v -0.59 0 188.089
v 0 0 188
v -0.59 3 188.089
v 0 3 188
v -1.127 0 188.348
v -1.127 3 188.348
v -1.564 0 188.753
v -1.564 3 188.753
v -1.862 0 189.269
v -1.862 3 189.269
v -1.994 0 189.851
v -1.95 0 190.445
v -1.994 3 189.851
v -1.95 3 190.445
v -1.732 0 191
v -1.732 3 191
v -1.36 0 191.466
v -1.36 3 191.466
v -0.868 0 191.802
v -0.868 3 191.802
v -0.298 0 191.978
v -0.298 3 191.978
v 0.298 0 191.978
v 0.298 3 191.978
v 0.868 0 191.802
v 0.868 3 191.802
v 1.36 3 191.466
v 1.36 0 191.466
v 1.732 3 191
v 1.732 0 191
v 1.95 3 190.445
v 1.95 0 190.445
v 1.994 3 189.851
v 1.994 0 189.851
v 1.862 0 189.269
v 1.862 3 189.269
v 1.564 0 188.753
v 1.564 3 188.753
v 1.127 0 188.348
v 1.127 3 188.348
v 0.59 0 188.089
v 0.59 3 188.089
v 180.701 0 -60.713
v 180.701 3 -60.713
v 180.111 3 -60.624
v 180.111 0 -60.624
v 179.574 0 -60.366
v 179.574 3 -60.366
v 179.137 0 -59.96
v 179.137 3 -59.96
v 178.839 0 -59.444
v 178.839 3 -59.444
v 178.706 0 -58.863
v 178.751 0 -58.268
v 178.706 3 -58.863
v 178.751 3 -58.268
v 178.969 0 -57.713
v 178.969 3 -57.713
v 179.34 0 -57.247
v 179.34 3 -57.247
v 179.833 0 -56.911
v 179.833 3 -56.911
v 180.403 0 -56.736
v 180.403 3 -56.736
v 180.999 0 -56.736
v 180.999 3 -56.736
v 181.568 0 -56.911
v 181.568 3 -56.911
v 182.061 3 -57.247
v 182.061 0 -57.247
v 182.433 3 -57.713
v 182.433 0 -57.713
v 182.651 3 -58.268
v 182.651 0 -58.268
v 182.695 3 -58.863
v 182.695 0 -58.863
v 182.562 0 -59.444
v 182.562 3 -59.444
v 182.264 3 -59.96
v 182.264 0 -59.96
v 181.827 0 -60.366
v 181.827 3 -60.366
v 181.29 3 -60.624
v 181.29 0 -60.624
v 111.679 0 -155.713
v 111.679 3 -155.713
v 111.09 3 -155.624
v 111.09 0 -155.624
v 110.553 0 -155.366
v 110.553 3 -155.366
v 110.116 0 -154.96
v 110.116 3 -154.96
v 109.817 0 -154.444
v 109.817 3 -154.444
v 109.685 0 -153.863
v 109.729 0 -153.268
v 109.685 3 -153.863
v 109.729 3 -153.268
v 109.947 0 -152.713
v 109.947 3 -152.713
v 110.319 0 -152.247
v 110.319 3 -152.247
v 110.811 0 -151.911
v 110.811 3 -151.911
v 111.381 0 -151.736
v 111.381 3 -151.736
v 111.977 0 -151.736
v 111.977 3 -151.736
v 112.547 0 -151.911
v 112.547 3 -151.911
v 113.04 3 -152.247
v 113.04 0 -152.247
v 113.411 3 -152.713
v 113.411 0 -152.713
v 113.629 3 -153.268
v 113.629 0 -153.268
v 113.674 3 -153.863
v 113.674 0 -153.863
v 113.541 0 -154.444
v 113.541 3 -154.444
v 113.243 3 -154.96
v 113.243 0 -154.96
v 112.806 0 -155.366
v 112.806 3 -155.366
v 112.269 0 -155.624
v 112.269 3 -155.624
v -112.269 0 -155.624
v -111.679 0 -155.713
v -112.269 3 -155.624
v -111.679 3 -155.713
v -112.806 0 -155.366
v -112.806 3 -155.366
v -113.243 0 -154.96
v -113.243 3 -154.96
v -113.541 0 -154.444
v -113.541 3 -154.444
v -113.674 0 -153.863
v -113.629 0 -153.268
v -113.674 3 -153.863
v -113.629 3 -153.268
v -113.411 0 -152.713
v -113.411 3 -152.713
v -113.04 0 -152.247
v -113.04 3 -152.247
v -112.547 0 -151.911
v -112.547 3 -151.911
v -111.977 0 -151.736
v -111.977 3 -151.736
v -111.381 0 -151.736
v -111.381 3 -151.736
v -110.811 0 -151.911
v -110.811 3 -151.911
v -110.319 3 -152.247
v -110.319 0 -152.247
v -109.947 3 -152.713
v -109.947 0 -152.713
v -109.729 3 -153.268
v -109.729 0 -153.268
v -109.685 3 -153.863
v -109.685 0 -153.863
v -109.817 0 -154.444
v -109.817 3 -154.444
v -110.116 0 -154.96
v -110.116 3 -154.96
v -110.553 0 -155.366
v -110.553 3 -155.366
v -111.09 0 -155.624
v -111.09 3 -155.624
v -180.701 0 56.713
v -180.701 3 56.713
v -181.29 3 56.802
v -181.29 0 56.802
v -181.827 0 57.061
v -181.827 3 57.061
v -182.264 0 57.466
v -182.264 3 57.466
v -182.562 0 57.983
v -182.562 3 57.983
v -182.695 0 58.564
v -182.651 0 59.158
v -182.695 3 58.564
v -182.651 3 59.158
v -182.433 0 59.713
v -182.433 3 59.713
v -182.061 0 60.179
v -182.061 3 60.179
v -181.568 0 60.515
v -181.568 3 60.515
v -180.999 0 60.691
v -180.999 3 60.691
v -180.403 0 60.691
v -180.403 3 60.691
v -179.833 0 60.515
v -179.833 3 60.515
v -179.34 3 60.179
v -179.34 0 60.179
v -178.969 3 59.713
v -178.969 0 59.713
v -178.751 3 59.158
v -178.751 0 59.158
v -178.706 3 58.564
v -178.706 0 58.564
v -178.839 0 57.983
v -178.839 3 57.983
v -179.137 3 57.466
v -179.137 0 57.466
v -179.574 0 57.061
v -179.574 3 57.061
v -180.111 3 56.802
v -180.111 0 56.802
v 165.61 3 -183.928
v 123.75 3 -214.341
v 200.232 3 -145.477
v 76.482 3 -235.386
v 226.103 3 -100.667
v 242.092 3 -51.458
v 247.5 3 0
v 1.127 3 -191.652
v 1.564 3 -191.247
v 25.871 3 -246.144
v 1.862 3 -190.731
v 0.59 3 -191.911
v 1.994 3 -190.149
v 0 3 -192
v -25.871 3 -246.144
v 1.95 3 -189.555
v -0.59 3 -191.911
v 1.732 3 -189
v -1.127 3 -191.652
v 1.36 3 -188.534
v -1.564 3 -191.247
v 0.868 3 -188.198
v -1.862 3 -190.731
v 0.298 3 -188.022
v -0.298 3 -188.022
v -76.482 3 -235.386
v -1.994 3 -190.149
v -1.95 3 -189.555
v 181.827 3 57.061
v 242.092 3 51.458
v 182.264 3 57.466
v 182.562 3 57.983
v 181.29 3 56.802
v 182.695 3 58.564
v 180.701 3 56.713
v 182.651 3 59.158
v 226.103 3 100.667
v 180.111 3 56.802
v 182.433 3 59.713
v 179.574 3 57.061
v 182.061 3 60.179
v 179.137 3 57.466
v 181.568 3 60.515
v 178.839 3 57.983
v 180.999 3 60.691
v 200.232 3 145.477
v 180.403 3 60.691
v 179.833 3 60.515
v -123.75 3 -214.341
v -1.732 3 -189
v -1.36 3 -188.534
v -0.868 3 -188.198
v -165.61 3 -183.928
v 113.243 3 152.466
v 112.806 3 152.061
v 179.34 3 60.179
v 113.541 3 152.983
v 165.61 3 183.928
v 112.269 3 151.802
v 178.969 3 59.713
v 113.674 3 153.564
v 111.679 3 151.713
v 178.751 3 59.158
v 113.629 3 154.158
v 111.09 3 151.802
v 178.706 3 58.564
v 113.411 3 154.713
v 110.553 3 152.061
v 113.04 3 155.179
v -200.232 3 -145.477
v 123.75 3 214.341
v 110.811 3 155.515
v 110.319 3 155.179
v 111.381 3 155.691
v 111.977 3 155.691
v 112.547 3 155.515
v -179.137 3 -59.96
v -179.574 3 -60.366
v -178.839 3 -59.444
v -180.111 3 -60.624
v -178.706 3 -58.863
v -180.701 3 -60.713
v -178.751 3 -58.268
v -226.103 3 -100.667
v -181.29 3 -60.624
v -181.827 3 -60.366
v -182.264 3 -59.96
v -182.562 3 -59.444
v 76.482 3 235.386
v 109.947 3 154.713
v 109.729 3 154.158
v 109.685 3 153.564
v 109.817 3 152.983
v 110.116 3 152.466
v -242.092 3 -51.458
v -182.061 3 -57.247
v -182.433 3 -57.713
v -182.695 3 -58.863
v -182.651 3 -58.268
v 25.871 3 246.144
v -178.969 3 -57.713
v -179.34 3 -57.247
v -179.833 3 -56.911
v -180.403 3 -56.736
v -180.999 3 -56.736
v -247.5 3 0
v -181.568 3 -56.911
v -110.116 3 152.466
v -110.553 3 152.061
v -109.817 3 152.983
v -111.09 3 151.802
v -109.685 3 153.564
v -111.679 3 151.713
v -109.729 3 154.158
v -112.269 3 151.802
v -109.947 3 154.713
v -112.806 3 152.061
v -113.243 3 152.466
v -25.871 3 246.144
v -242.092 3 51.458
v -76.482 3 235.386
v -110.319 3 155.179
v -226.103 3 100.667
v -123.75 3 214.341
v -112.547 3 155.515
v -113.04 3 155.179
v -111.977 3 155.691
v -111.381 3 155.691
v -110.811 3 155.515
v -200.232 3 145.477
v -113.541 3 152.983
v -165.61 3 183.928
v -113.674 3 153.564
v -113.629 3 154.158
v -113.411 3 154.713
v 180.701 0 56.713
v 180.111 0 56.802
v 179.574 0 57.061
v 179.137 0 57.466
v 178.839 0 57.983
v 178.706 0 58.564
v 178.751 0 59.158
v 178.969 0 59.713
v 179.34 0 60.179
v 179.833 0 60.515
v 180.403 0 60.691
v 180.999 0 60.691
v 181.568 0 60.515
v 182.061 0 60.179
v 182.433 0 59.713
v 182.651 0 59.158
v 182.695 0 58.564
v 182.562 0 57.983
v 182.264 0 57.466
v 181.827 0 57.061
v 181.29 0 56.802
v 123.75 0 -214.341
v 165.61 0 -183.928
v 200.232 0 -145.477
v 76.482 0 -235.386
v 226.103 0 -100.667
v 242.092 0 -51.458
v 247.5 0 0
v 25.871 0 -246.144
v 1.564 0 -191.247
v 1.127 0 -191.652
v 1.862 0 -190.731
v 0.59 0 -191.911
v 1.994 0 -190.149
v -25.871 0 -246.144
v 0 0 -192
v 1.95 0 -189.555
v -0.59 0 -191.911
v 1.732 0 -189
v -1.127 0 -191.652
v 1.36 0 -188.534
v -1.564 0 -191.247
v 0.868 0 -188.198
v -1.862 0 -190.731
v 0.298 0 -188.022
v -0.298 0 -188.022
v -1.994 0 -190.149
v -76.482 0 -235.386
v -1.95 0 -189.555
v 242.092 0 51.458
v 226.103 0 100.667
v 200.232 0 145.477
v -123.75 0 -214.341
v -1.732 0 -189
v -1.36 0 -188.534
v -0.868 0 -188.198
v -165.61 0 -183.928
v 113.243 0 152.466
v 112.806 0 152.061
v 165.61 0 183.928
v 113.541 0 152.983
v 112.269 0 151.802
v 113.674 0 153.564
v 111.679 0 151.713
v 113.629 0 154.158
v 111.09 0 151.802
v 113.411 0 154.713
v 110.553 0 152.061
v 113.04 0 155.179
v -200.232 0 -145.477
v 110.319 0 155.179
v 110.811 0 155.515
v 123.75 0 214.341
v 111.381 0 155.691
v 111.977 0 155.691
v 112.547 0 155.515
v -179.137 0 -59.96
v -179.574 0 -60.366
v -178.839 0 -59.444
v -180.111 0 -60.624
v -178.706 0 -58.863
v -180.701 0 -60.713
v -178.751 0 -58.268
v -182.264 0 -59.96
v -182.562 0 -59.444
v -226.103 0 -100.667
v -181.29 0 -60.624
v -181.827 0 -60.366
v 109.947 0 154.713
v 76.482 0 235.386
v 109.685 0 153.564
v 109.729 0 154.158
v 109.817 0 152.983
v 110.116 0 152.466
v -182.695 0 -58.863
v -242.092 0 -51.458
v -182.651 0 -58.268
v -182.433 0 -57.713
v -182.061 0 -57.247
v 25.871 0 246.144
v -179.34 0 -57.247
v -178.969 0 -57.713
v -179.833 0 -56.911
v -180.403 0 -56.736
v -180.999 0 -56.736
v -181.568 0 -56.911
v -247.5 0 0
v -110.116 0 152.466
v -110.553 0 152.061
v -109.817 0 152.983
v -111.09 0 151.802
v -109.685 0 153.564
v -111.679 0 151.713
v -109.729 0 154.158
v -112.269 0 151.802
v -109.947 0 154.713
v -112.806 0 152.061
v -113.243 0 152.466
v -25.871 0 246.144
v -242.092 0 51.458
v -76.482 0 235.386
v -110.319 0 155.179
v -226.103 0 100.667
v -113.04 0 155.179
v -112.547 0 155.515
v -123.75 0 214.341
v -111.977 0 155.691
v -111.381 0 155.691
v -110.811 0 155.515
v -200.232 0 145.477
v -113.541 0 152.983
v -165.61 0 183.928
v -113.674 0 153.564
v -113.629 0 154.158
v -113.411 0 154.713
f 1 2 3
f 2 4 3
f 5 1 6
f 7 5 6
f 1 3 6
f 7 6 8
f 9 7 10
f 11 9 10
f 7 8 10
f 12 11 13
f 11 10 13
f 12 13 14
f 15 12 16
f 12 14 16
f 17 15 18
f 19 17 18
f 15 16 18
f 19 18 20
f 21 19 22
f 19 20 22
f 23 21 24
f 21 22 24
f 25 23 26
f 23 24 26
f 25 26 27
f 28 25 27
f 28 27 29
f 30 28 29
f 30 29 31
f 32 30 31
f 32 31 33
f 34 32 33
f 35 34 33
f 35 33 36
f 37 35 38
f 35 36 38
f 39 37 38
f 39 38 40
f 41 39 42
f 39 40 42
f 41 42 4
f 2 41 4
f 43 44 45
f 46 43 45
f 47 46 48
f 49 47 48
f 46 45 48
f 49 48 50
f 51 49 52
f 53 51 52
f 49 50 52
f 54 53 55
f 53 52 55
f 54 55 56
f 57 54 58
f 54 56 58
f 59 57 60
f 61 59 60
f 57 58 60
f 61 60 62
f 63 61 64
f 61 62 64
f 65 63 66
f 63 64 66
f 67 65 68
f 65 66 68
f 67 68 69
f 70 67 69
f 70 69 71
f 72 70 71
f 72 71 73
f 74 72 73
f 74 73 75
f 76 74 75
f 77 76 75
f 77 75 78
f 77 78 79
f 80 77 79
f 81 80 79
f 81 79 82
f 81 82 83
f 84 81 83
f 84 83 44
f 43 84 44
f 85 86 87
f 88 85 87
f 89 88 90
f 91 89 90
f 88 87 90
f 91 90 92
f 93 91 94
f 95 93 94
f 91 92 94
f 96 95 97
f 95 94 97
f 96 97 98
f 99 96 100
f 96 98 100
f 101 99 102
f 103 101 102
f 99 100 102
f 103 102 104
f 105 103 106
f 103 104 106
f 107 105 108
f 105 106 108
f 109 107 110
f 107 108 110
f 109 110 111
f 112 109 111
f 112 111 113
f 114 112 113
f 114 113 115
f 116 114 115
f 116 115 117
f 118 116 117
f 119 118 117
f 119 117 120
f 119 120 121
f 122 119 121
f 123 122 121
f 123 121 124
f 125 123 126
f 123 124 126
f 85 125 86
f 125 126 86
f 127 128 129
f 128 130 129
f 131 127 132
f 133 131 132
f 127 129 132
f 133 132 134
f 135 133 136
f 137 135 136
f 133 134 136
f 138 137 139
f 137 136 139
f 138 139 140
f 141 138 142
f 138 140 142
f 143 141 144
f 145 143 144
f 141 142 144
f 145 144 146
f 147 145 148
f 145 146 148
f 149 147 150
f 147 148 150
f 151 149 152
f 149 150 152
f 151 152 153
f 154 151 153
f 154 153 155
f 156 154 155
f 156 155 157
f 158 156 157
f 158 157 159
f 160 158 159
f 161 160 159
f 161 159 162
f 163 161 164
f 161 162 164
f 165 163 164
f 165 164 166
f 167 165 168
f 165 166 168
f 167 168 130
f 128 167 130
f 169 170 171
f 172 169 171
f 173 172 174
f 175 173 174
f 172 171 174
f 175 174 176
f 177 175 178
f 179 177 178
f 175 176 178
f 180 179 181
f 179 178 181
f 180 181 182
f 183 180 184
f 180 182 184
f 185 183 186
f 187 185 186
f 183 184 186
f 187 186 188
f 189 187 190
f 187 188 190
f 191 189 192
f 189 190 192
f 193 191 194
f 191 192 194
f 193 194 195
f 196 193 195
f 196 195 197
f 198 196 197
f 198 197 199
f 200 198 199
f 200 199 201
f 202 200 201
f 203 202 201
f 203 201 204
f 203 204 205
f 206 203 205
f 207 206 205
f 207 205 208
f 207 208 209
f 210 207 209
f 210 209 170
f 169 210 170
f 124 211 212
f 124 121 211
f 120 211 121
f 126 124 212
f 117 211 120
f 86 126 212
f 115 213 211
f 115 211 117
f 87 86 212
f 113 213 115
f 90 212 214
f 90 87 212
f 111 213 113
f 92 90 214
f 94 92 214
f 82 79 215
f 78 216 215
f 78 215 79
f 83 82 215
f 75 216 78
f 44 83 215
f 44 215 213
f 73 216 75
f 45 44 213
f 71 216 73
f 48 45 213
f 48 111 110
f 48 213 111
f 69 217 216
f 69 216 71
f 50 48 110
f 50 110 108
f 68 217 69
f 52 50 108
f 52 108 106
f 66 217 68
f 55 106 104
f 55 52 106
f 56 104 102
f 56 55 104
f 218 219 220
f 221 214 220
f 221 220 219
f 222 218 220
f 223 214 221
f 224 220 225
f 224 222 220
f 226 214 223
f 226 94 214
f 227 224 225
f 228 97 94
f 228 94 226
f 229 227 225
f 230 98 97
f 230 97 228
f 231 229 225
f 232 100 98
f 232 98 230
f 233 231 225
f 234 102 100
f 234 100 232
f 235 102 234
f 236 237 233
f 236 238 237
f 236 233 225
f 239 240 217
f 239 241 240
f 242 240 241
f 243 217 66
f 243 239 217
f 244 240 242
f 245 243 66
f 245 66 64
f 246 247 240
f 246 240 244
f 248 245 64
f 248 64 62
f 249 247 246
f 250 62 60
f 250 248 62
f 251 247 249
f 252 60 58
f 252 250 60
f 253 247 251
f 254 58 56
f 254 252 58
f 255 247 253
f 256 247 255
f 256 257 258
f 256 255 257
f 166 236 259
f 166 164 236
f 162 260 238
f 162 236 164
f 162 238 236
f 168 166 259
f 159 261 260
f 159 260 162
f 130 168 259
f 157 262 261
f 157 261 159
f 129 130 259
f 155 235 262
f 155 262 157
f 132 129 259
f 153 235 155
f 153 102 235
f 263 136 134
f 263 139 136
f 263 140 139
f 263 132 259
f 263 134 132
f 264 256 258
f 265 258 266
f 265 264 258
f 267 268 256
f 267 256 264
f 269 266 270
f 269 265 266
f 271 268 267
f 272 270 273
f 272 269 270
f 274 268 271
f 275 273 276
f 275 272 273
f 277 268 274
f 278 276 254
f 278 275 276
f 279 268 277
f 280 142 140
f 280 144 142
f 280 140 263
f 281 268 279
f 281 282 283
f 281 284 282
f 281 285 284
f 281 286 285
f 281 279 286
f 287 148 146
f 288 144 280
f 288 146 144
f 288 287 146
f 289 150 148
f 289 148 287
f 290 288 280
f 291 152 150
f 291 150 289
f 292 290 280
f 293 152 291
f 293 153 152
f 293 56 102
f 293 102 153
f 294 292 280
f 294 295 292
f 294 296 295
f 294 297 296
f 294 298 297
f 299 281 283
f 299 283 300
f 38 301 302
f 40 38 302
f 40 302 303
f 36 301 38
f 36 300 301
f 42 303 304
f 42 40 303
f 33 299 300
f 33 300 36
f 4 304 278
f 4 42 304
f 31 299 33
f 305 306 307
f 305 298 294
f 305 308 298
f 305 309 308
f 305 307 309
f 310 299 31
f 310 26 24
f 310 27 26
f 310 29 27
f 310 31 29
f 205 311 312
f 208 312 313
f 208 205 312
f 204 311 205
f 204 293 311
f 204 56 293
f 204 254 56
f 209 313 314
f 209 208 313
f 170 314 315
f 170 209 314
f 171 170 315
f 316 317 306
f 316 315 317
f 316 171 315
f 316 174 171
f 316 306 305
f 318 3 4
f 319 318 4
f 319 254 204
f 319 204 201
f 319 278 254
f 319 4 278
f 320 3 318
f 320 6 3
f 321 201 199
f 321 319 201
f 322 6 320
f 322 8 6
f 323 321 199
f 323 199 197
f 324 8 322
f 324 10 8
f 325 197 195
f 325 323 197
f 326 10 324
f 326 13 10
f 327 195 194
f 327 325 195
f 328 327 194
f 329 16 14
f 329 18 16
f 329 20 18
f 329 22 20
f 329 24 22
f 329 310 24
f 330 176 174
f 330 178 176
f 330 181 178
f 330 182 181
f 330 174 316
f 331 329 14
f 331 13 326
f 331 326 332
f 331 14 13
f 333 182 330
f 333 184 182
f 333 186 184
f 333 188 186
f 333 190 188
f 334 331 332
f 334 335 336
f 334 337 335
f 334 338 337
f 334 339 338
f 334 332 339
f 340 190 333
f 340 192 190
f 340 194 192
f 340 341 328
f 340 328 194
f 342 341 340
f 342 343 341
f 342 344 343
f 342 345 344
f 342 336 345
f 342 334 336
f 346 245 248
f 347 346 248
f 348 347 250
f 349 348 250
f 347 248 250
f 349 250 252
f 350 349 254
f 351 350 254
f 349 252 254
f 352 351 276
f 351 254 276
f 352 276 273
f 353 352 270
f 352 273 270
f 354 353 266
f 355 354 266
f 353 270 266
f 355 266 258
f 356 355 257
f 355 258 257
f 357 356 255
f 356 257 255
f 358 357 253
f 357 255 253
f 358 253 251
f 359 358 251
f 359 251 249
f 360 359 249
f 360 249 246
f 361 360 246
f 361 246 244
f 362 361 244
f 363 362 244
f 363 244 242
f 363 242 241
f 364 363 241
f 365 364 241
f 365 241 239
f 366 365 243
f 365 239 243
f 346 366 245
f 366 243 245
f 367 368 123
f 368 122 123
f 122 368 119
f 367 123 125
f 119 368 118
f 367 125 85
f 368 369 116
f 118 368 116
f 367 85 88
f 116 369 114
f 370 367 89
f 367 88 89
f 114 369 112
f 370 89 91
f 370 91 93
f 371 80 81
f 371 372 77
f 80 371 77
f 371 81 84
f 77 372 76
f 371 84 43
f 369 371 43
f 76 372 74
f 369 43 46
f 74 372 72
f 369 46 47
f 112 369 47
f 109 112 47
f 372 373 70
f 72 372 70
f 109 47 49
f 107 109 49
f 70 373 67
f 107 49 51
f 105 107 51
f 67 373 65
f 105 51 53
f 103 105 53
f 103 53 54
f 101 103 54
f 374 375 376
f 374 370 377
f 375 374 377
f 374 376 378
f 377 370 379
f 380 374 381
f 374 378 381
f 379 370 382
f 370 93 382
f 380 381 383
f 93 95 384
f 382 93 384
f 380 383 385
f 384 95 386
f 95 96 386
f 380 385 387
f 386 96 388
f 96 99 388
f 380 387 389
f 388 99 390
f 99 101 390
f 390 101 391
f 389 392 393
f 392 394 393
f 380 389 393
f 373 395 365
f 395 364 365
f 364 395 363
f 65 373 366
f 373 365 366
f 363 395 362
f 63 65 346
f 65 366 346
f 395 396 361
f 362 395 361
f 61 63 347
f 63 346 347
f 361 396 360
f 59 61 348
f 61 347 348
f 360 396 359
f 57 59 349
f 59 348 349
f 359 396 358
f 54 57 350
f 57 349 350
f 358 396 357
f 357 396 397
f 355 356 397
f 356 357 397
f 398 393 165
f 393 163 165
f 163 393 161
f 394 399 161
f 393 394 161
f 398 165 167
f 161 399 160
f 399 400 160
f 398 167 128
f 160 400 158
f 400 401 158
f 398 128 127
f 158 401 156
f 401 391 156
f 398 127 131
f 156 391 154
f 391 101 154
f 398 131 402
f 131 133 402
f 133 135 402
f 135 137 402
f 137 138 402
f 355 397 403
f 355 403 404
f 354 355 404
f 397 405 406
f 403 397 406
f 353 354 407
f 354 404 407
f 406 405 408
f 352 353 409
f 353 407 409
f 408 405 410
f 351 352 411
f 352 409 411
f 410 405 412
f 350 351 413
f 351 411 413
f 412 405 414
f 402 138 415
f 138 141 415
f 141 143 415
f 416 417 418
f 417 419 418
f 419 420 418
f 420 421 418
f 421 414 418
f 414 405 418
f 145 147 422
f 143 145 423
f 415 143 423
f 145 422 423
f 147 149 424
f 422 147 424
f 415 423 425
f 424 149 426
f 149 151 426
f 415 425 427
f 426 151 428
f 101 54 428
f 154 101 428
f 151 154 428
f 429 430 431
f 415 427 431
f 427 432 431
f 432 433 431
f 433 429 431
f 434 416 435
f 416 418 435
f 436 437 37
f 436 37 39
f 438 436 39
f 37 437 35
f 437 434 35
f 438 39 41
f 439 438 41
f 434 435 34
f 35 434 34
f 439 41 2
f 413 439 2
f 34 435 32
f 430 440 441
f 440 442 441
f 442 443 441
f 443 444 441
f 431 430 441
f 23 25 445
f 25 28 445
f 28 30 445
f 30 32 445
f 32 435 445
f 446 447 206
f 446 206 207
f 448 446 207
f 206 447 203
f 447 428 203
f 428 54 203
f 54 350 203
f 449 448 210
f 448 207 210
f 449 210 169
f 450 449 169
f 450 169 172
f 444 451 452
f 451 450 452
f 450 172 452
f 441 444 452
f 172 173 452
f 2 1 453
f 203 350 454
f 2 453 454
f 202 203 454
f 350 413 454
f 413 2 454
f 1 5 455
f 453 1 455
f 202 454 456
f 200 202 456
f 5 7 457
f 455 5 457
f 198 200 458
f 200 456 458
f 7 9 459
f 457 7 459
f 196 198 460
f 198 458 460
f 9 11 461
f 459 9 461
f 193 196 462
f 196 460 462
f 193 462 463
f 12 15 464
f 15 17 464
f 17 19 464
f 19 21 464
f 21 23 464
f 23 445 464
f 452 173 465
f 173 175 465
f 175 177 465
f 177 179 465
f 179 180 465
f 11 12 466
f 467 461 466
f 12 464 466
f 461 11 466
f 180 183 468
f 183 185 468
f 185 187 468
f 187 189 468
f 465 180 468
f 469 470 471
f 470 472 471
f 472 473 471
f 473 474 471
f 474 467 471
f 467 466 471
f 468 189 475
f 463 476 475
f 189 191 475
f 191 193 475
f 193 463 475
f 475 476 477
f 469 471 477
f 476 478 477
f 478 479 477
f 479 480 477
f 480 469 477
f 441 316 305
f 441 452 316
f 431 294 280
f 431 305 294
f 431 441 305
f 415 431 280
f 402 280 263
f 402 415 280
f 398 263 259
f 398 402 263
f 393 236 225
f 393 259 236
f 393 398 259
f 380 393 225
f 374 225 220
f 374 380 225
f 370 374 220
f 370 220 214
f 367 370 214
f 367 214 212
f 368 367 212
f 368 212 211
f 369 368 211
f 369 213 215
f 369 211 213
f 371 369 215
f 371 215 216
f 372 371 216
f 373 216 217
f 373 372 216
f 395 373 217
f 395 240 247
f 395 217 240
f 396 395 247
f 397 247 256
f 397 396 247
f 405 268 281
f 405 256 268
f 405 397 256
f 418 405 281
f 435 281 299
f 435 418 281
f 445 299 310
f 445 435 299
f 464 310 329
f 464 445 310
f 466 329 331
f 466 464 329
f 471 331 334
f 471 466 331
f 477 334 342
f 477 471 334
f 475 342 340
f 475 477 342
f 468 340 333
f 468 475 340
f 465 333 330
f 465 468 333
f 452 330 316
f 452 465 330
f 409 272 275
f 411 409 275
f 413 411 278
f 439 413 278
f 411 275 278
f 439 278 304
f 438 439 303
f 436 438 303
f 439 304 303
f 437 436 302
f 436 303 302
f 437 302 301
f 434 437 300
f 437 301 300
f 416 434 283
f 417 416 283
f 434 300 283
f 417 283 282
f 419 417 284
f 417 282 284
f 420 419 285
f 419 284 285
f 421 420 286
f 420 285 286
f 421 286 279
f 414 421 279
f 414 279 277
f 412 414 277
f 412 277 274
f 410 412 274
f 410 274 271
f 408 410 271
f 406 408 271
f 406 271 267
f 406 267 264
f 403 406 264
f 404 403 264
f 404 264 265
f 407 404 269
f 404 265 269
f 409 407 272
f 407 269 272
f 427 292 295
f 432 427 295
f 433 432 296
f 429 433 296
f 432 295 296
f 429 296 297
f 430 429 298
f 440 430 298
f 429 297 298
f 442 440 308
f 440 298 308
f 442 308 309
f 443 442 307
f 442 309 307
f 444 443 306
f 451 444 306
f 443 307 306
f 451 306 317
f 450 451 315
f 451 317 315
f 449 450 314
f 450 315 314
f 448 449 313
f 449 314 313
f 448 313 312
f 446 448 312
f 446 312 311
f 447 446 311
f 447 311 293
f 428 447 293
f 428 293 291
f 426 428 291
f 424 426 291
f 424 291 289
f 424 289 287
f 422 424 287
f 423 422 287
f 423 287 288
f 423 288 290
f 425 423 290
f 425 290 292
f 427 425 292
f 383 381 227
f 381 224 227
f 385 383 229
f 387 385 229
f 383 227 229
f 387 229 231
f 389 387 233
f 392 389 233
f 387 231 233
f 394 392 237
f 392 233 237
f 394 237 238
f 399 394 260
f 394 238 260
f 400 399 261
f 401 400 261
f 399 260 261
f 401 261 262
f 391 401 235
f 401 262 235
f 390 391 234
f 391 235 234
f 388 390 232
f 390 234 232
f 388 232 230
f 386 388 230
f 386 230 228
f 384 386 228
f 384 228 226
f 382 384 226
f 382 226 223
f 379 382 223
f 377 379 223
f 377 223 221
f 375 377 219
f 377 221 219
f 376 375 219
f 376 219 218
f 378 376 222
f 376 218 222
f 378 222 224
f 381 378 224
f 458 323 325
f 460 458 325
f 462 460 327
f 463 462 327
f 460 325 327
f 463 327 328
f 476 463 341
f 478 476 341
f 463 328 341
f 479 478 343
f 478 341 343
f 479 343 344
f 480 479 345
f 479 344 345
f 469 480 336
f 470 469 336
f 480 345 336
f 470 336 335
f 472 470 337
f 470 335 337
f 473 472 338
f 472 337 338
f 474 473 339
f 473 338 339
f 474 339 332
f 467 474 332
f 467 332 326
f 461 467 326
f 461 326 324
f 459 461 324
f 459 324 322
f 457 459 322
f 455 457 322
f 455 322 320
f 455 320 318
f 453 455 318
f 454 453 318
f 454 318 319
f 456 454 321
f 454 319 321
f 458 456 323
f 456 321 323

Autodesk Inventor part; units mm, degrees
ref_plane "YZ Plane" through (0, 0, 0) normal (1, 0, 0) x (0, 1, 0)
ref_plane "XZ Plane" through (0, 0, 0) normal (0, 1, 0) x (-1, 0, 0)
ref_plane "XY Plane" through (0, 0, 0) normal (0, 0, 1) x (1, 0, 0)
sketch "Skizze1" plane through (0, 0, 0) normal (0, 1, 0) x (-1, 0, 0)
  circle A0 centre (0, 0) radius 247.5
  dimension "d0" = 495
extrude "Extrusion_grundplatte" add sketch "Skizze1" along normal blind 3
sketch "Skizze6" plane through (0, 0, 0) normal (0, -1, 0) x (1, 0, 0)
  circle A0 centre (0, 0) radius 247.5 projected
  line L0 (0, 0) -> (0, 190) construction
  line L1 (0, 0) -> (-111.6792, 153.7132) construction
  line L2 (0, 0) -> (-180.7007, 58.7132) construction
  line L3 (0, 0) -> (-180.7007, -58.7132) construction
  line L4 (0, 0) -> (-111.6792, -153.7132) construction
  line L5 (0, 0) -> (0, -190) construction
  line L6 (0, 0) -> (111.6792, -153.7132) construction
  line L7 (0, 0) -> (180.7007, -58.7132) construction
  line L8 (0, 0) -> (180.7007, 58.7132) construction
  line L9 (0, 0) -> (111.6792, 153.7132) construction
  dimension "d47" = 190
  dimension "d50" = 360
hole "Bohrung_halter_plexiglas" at (0, 0, 190) at (-111.6792, 0, 153.7132) at (-180.7007, 0, 58.7132) at (-180.7007, 0, -58.7132) at (-111.6792, 0, -153.7132) at (0, 0, -190) at (111.6792, 0, -153.7132) at (180.7007, 0, -58.7132) at (180.7007, 0, 58.7132) at (111.6792, 0, 153.7132) direction (0, 1, 0) diameter 4 end through all
properties part number "Plexiglas" material "Plexiglas"
